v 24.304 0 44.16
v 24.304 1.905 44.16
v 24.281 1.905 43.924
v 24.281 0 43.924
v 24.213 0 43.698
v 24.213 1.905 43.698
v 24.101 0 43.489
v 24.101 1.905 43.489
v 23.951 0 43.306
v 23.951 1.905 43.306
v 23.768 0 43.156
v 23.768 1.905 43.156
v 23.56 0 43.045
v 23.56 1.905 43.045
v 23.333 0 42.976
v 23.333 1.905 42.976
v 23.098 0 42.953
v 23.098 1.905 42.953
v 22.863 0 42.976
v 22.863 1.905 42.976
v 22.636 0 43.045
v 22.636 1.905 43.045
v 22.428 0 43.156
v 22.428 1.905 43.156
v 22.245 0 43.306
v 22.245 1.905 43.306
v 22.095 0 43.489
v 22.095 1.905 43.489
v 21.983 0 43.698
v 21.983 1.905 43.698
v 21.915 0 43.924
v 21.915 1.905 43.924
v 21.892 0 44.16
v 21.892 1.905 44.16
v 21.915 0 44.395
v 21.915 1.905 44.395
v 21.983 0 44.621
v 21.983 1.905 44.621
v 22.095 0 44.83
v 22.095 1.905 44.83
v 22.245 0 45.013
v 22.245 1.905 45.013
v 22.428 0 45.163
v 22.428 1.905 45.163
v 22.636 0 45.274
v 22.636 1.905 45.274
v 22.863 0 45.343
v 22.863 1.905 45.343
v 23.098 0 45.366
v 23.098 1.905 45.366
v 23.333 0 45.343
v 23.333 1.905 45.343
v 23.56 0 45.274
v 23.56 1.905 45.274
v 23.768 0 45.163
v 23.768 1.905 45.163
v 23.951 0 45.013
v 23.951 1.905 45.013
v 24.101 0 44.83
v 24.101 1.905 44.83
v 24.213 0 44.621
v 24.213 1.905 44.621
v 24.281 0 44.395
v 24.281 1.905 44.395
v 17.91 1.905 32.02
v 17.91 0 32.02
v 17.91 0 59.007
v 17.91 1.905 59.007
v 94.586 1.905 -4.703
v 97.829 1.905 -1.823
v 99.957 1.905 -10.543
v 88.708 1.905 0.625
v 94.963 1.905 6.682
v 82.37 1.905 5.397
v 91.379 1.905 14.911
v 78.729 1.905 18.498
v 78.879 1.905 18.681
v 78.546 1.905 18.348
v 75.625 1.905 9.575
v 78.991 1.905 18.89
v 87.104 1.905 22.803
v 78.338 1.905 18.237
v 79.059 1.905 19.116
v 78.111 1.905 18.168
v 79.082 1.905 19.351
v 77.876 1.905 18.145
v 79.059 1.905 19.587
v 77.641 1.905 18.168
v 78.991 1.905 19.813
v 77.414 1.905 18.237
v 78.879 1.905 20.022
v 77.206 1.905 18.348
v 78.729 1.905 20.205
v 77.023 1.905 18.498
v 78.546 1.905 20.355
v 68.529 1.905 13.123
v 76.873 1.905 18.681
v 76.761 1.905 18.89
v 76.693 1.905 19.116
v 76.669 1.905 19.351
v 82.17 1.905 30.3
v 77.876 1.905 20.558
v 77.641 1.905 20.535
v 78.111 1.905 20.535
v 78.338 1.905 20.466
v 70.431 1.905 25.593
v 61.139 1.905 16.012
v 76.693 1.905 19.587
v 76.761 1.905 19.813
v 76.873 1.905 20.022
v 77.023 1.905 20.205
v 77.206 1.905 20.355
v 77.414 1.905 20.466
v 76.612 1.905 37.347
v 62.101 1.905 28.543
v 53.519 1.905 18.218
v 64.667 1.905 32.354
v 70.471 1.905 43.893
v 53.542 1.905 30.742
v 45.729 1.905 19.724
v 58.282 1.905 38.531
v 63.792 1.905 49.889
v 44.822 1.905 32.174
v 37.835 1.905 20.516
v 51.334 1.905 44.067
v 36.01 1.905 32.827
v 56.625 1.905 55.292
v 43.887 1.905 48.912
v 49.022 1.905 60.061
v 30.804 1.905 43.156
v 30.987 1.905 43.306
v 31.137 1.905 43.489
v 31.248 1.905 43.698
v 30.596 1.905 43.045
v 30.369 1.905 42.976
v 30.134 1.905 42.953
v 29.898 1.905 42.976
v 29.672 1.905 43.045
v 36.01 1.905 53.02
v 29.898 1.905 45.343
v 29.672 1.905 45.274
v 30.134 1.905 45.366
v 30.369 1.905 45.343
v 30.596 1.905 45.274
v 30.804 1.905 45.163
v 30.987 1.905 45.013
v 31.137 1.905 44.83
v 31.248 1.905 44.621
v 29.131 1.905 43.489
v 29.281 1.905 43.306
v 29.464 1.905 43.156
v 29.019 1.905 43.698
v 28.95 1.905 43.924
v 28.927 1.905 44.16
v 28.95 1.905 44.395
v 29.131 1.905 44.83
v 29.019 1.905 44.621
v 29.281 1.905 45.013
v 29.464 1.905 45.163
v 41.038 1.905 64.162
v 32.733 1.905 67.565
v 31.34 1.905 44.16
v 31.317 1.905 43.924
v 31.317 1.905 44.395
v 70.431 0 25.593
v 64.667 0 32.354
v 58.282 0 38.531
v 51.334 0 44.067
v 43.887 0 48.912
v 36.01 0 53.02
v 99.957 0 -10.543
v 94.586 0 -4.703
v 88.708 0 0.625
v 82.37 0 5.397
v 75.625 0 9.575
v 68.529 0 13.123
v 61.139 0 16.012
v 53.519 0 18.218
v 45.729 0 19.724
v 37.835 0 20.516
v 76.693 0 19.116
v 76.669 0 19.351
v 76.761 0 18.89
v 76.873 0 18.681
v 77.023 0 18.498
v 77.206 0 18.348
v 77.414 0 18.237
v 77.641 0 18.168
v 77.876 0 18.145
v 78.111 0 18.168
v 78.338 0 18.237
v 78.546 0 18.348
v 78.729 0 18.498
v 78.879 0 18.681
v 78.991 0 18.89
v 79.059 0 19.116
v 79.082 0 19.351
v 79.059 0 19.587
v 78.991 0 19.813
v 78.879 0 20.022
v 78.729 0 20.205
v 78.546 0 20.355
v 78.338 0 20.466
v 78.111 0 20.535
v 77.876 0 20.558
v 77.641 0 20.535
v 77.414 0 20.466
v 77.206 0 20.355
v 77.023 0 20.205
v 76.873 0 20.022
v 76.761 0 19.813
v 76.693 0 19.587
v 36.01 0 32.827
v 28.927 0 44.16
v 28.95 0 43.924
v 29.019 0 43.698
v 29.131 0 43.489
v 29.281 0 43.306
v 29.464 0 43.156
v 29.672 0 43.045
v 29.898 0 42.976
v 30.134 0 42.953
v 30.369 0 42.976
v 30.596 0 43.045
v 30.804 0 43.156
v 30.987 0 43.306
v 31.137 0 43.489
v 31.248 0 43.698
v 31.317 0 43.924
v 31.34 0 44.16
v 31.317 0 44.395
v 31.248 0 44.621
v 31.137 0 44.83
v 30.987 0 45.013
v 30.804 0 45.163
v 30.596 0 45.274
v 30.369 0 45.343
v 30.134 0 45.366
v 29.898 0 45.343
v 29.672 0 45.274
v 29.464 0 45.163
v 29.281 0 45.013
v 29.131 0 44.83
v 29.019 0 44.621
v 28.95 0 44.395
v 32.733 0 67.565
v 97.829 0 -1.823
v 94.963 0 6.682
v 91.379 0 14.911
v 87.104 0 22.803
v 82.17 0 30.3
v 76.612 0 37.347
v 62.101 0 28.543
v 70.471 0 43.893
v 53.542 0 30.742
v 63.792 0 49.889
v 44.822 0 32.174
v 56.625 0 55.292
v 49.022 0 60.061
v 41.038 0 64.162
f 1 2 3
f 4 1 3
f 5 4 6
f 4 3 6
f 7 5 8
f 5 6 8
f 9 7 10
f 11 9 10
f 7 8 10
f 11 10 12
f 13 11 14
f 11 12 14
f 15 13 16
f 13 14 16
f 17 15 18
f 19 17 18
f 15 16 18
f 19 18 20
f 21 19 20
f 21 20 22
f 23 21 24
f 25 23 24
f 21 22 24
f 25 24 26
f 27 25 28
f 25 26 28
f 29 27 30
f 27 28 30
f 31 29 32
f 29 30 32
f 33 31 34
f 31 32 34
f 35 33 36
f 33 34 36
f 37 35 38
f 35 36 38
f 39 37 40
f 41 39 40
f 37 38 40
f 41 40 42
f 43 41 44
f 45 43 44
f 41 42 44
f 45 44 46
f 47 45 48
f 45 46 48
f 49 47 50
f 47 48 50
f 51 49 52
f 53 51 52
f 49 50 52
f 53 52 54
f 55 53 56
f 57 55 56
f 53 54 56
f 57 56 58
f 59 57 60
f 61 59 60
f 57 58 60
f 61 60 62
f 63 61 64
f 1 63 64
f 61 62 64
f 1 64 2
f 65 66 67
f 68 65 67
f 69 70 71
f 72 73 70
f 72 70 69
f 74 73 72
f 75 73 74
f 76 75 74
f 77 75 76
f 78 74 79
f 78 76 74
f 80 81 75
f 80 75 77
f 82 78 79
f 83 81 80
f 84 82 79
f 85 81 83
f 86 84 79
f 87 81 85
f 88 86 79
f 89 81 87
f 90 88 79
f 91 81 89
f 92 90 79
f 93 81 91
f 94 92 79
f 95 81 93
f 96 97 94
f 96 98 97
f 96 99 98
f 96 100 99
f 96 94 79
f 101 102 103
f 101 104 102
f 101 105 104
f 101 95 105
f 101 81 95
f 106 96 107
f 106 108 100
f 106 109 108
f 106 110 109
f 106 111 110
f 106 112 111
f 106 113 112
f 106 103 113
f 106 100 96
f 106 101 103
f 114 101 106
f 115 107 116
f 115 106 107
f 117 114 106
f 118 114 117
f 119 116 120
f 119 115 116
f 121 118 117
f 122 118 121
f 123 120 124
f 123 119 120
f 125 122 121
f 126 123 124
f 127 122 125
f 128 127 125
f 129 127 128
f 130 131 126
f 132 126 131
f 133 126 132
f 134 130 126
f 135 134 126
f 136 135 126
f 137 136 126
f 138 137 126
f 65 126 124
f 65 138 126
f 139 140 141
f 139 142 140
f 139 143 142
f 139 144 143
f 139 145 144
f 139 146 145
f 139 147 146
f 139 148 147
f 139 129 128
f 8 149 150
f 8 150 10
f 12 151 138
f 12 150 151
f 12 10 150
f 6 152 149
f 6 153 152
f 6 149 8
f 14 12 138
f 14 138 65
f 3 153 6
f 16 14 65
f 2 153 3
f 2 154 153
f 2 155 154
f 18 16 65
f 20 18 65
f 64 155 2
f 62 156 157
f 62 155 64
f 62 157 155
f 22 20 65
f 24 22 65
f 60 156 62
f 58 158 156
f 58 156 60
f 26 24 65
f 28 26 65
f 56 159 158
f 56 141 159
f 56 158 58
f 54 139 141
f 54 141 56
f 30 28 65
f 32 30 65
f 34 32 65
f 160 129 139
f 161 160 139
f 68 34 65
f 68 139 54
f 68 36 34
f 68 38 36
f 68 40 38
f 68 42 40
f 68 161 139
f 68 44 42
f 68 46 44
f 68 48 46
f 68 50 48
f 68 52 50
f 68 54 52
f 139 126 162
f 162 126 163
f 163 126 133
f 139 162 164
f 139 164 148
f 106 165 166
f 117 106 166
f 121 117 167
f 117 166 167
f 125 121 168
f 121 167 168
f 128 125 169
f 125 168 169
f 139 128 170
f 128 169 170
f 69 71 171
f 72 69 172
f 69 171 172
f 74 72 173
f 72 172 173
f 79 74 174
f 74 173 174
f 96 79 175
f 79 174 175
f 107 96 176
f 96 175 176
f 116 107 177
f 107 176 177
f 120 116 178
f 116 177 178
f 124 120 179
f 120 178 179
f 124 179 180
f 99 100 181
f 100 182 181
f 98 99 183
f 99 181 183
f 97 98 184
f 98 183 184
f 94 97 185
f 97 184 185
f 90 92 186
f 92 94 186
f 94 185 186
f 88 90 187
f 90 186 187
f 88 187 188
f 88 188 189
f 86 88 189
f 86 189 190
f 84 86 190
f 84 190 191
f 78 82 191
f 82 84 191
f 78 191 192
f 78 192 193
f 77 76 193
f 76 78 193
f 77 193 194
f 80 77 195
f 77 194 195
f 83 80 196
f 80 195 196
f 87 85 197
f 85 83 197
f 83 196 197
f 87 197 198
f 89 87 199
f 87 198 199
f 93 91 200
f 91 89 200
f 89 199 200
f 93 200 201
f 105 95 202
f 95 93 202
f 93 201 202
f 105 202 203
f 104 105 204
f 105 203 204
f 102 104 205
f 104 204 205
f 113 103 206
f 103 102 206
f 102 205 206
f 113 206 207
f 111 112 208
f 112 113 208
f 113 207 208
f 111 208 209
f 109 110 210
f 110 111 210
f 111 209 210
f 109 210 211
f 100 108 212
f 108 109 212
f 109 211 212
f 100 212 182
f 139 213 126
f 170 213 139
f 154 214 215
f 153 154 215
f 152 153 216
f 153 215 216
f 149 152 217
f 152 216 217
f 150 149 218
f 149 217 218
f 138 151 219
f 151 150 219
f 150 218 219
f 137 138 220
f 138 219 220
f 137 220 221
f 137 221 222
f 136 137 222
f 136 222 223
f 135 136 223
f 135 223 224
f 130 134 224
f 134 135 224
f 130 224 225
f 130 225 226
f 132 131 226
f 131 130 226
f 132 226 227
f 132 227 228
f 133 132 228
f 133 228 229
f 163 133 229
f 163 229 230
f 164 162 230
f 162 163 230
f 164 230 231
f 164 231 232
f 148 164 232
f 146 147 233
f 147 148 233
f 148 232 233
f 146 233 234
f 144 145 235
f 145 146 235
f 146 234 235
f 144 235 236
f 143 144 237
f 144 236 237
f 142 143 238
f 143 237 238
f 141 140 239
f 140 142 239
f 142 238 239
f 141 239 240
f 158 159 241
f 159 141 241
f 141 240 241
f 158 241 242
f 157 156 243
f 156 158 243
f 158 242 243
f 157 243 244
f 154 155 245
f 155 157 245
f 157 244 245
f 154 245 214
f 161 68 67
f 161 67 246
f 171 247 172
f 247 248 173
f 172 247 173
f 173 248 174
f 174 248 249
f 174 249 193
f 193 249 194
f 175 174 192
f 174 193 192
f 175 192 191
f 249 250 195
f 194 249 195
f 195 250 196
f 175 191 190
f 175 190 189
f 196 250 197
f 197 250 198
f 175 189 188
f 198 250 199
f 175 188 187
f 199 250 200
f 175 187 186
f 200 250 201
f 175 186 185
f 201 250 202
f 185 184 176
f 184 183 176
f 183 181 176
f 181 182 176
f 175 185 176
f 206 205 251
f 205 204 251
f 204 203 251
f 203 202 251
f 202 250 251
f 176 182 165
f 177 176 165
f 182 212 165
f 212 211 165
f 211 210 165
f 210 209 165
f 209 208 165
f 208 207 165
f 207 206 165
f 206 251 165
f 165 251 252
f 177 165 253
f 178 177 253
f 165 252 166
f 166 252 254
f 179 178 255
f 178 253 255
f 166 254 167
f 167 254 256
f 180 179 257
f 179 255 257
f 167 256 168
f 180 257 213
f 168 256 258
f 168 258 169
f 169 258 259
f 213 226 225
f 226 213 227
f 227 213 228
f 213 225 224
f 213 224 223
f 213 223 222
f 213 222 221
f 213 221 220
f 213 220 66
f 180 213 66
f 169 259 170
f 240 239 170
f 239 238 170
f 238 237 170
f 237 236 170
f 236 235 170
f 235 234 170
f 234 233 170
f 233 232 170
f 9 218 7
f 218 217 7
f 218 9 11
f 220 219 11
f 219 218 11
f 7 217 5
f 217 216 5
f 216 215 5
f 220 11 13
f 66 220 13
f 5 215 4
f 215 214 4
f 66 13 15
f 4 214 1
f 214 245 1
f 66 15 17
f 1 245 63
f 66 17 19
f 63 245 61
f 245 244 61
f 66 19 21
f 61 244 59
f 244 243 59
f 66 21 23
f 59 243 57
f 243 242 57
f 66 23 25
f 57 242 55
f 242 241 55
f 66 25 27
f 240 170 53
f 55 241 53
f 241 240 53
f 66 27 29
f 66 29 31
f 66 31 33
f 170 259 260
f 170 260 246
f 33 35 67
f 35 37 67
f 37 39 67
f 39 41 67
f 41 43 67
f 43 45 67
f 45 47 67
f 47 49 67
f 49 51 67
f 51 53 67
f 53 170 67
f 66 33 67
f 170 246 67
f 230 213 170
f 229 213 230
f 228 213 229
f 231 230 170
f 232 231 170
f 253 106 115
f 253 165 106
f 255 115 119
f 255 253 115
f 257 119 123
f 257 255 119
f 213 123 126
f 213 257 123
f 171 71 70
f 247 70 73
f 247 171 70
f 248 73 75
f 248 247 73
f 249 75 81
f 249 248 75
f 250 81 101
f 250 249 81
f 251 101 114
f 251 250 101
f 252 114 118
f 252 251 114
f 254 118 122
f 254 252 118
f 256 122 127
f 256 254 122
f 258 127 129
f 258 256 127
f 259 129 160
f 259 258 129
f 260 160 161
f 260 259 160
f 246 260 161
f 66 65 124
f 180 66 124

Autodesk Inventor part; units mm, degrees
ref_plane "YZ Plane" through (0, 0, 0) normal (1, 0, 0) x (0, 1, 0)
ref_plane "XZ Plane" through (0, 0, 0) normal (0, 1, 0) x (-1, 0, 0)
ref_plane "XY Plane" through (0, 0, 0) normal (0, 0, 1) x (1, 0, 0)
sketch "Sketch12" plane through (0, 0, 0) normal (0, 1, 0) x (-1, 0, 0)
  arc A0 (-17.9101, 19.3197) -> (-99.957, -10.5429) centre (-33.0718, -66.6663) ccw
  arc A1 (-36.0097, 32.8266) -> (-70.4306, 25.593) centre (-33.0718, -66.6663) ccw
  circle A2 centre (-30.1338, 44.1595) radius 1.016
  line L0 (-36.0097, 32.8266) -> (-36.0097, 53.0201)
  arc A3 (-36.0097, 53.0201) -> (-70.4306, 25.593) centre (2.8014, -31.0003) ccw
  line L1 (-17.9101, 19.3197) -> (-17.9101, 71.7072)
  arc A4 (-17.9101, 71.7072) -> (-99.957, -10.5429) centre (2.8014, -31.0003) ccw
  circle A5 centre (-30.1338, 44.1595) radius 1.2065
  circle A6 centre (-77.8759, 19.3514) radius 1.2065
extrude "Extrusion13" add sketch "Sketch12" along normal blind 1.905 contours A0 A4 L1
sketch "Sketch20" plane through (0, 1.905, 0) normal (0, 1, 0) x (1, 0, 0)
  circle A0 centre (30.1338, -44.1595) radius 1.2065 projected
  line L0 (30.1338, -42.953) -> (30.1338, -44.1595)
  line L1 (30.1338, -44.1595) -> (23.098, -44.1595)
  circle A1 centre (23.098, -44.1595) radius 1.2065
  point P0 (0, 0)
  dimension "d94" = 7.0358
extrude "Extrusion15" cut sketch "Sketch20" against normal blind 3.175 contours A1
sketch "Sketch22" plane through (0, 1.905, 0) normal (0, 1, 0) x (1, 0, 0)
  line L0 (17.9101, -19.3197) -> (17.9101, -71.7072) projected
  line L1 (17.9101, -19.3197) -> (17.9101, -32.0197)
  line L2 (17.9101, -32.0197) -> (37.8348, -20.5162)
  arc A0 (17.9101, -71.7072) -> (99.957, 10.5429) centre (-2.8014, 31.0003) ccw projected
  line L3 (17.9101, -71.7072) -> (17.9101, -59.0072)
  line L4 (17.9101, -59.0072) -> (32.7327, -67.565)
  arc A1 (17.9101, -71.7072) -> (32.7327, -67.565) centre (-2.8014, 31.0003) ccw
  arc A2 (17.9101, -19.3197) -> (99.957, 10.5429) centre (33.0718, 66.6663) ccw projected
  arc A3 (17.9101, -19.3197) -> (37.8348, -20.5162) centre (33.0718, 66.6663) ccw
  point P0 (0, 0)
  dimension "d103" = 12.7
  dimension "d104" = 60
  dimension "d105" = 12.7
  dimension "d106" = 60
extrude "Extrusion17" cut sketch "Sketch22" against normal blind 3.175 contours A2 L2 L0 | L4 A0 L0
move or copy body "Move Body1" bodies to move or copy 1 copy no rotation origin (0, 0, 0) rotation axis (0, 0, 1) rotation angle -90 translate (16.0051, 19.8151, 0)
move or copy body "Move Body2" bodies to move or copy 1 copy no rotation origin (0, 0, 0) rotation axis (0, 0, 1) rotation angle 90 translate (19.8151, -16.0051, 0)
properties part number "landing-gear-claws" material "ABS Plastic"
